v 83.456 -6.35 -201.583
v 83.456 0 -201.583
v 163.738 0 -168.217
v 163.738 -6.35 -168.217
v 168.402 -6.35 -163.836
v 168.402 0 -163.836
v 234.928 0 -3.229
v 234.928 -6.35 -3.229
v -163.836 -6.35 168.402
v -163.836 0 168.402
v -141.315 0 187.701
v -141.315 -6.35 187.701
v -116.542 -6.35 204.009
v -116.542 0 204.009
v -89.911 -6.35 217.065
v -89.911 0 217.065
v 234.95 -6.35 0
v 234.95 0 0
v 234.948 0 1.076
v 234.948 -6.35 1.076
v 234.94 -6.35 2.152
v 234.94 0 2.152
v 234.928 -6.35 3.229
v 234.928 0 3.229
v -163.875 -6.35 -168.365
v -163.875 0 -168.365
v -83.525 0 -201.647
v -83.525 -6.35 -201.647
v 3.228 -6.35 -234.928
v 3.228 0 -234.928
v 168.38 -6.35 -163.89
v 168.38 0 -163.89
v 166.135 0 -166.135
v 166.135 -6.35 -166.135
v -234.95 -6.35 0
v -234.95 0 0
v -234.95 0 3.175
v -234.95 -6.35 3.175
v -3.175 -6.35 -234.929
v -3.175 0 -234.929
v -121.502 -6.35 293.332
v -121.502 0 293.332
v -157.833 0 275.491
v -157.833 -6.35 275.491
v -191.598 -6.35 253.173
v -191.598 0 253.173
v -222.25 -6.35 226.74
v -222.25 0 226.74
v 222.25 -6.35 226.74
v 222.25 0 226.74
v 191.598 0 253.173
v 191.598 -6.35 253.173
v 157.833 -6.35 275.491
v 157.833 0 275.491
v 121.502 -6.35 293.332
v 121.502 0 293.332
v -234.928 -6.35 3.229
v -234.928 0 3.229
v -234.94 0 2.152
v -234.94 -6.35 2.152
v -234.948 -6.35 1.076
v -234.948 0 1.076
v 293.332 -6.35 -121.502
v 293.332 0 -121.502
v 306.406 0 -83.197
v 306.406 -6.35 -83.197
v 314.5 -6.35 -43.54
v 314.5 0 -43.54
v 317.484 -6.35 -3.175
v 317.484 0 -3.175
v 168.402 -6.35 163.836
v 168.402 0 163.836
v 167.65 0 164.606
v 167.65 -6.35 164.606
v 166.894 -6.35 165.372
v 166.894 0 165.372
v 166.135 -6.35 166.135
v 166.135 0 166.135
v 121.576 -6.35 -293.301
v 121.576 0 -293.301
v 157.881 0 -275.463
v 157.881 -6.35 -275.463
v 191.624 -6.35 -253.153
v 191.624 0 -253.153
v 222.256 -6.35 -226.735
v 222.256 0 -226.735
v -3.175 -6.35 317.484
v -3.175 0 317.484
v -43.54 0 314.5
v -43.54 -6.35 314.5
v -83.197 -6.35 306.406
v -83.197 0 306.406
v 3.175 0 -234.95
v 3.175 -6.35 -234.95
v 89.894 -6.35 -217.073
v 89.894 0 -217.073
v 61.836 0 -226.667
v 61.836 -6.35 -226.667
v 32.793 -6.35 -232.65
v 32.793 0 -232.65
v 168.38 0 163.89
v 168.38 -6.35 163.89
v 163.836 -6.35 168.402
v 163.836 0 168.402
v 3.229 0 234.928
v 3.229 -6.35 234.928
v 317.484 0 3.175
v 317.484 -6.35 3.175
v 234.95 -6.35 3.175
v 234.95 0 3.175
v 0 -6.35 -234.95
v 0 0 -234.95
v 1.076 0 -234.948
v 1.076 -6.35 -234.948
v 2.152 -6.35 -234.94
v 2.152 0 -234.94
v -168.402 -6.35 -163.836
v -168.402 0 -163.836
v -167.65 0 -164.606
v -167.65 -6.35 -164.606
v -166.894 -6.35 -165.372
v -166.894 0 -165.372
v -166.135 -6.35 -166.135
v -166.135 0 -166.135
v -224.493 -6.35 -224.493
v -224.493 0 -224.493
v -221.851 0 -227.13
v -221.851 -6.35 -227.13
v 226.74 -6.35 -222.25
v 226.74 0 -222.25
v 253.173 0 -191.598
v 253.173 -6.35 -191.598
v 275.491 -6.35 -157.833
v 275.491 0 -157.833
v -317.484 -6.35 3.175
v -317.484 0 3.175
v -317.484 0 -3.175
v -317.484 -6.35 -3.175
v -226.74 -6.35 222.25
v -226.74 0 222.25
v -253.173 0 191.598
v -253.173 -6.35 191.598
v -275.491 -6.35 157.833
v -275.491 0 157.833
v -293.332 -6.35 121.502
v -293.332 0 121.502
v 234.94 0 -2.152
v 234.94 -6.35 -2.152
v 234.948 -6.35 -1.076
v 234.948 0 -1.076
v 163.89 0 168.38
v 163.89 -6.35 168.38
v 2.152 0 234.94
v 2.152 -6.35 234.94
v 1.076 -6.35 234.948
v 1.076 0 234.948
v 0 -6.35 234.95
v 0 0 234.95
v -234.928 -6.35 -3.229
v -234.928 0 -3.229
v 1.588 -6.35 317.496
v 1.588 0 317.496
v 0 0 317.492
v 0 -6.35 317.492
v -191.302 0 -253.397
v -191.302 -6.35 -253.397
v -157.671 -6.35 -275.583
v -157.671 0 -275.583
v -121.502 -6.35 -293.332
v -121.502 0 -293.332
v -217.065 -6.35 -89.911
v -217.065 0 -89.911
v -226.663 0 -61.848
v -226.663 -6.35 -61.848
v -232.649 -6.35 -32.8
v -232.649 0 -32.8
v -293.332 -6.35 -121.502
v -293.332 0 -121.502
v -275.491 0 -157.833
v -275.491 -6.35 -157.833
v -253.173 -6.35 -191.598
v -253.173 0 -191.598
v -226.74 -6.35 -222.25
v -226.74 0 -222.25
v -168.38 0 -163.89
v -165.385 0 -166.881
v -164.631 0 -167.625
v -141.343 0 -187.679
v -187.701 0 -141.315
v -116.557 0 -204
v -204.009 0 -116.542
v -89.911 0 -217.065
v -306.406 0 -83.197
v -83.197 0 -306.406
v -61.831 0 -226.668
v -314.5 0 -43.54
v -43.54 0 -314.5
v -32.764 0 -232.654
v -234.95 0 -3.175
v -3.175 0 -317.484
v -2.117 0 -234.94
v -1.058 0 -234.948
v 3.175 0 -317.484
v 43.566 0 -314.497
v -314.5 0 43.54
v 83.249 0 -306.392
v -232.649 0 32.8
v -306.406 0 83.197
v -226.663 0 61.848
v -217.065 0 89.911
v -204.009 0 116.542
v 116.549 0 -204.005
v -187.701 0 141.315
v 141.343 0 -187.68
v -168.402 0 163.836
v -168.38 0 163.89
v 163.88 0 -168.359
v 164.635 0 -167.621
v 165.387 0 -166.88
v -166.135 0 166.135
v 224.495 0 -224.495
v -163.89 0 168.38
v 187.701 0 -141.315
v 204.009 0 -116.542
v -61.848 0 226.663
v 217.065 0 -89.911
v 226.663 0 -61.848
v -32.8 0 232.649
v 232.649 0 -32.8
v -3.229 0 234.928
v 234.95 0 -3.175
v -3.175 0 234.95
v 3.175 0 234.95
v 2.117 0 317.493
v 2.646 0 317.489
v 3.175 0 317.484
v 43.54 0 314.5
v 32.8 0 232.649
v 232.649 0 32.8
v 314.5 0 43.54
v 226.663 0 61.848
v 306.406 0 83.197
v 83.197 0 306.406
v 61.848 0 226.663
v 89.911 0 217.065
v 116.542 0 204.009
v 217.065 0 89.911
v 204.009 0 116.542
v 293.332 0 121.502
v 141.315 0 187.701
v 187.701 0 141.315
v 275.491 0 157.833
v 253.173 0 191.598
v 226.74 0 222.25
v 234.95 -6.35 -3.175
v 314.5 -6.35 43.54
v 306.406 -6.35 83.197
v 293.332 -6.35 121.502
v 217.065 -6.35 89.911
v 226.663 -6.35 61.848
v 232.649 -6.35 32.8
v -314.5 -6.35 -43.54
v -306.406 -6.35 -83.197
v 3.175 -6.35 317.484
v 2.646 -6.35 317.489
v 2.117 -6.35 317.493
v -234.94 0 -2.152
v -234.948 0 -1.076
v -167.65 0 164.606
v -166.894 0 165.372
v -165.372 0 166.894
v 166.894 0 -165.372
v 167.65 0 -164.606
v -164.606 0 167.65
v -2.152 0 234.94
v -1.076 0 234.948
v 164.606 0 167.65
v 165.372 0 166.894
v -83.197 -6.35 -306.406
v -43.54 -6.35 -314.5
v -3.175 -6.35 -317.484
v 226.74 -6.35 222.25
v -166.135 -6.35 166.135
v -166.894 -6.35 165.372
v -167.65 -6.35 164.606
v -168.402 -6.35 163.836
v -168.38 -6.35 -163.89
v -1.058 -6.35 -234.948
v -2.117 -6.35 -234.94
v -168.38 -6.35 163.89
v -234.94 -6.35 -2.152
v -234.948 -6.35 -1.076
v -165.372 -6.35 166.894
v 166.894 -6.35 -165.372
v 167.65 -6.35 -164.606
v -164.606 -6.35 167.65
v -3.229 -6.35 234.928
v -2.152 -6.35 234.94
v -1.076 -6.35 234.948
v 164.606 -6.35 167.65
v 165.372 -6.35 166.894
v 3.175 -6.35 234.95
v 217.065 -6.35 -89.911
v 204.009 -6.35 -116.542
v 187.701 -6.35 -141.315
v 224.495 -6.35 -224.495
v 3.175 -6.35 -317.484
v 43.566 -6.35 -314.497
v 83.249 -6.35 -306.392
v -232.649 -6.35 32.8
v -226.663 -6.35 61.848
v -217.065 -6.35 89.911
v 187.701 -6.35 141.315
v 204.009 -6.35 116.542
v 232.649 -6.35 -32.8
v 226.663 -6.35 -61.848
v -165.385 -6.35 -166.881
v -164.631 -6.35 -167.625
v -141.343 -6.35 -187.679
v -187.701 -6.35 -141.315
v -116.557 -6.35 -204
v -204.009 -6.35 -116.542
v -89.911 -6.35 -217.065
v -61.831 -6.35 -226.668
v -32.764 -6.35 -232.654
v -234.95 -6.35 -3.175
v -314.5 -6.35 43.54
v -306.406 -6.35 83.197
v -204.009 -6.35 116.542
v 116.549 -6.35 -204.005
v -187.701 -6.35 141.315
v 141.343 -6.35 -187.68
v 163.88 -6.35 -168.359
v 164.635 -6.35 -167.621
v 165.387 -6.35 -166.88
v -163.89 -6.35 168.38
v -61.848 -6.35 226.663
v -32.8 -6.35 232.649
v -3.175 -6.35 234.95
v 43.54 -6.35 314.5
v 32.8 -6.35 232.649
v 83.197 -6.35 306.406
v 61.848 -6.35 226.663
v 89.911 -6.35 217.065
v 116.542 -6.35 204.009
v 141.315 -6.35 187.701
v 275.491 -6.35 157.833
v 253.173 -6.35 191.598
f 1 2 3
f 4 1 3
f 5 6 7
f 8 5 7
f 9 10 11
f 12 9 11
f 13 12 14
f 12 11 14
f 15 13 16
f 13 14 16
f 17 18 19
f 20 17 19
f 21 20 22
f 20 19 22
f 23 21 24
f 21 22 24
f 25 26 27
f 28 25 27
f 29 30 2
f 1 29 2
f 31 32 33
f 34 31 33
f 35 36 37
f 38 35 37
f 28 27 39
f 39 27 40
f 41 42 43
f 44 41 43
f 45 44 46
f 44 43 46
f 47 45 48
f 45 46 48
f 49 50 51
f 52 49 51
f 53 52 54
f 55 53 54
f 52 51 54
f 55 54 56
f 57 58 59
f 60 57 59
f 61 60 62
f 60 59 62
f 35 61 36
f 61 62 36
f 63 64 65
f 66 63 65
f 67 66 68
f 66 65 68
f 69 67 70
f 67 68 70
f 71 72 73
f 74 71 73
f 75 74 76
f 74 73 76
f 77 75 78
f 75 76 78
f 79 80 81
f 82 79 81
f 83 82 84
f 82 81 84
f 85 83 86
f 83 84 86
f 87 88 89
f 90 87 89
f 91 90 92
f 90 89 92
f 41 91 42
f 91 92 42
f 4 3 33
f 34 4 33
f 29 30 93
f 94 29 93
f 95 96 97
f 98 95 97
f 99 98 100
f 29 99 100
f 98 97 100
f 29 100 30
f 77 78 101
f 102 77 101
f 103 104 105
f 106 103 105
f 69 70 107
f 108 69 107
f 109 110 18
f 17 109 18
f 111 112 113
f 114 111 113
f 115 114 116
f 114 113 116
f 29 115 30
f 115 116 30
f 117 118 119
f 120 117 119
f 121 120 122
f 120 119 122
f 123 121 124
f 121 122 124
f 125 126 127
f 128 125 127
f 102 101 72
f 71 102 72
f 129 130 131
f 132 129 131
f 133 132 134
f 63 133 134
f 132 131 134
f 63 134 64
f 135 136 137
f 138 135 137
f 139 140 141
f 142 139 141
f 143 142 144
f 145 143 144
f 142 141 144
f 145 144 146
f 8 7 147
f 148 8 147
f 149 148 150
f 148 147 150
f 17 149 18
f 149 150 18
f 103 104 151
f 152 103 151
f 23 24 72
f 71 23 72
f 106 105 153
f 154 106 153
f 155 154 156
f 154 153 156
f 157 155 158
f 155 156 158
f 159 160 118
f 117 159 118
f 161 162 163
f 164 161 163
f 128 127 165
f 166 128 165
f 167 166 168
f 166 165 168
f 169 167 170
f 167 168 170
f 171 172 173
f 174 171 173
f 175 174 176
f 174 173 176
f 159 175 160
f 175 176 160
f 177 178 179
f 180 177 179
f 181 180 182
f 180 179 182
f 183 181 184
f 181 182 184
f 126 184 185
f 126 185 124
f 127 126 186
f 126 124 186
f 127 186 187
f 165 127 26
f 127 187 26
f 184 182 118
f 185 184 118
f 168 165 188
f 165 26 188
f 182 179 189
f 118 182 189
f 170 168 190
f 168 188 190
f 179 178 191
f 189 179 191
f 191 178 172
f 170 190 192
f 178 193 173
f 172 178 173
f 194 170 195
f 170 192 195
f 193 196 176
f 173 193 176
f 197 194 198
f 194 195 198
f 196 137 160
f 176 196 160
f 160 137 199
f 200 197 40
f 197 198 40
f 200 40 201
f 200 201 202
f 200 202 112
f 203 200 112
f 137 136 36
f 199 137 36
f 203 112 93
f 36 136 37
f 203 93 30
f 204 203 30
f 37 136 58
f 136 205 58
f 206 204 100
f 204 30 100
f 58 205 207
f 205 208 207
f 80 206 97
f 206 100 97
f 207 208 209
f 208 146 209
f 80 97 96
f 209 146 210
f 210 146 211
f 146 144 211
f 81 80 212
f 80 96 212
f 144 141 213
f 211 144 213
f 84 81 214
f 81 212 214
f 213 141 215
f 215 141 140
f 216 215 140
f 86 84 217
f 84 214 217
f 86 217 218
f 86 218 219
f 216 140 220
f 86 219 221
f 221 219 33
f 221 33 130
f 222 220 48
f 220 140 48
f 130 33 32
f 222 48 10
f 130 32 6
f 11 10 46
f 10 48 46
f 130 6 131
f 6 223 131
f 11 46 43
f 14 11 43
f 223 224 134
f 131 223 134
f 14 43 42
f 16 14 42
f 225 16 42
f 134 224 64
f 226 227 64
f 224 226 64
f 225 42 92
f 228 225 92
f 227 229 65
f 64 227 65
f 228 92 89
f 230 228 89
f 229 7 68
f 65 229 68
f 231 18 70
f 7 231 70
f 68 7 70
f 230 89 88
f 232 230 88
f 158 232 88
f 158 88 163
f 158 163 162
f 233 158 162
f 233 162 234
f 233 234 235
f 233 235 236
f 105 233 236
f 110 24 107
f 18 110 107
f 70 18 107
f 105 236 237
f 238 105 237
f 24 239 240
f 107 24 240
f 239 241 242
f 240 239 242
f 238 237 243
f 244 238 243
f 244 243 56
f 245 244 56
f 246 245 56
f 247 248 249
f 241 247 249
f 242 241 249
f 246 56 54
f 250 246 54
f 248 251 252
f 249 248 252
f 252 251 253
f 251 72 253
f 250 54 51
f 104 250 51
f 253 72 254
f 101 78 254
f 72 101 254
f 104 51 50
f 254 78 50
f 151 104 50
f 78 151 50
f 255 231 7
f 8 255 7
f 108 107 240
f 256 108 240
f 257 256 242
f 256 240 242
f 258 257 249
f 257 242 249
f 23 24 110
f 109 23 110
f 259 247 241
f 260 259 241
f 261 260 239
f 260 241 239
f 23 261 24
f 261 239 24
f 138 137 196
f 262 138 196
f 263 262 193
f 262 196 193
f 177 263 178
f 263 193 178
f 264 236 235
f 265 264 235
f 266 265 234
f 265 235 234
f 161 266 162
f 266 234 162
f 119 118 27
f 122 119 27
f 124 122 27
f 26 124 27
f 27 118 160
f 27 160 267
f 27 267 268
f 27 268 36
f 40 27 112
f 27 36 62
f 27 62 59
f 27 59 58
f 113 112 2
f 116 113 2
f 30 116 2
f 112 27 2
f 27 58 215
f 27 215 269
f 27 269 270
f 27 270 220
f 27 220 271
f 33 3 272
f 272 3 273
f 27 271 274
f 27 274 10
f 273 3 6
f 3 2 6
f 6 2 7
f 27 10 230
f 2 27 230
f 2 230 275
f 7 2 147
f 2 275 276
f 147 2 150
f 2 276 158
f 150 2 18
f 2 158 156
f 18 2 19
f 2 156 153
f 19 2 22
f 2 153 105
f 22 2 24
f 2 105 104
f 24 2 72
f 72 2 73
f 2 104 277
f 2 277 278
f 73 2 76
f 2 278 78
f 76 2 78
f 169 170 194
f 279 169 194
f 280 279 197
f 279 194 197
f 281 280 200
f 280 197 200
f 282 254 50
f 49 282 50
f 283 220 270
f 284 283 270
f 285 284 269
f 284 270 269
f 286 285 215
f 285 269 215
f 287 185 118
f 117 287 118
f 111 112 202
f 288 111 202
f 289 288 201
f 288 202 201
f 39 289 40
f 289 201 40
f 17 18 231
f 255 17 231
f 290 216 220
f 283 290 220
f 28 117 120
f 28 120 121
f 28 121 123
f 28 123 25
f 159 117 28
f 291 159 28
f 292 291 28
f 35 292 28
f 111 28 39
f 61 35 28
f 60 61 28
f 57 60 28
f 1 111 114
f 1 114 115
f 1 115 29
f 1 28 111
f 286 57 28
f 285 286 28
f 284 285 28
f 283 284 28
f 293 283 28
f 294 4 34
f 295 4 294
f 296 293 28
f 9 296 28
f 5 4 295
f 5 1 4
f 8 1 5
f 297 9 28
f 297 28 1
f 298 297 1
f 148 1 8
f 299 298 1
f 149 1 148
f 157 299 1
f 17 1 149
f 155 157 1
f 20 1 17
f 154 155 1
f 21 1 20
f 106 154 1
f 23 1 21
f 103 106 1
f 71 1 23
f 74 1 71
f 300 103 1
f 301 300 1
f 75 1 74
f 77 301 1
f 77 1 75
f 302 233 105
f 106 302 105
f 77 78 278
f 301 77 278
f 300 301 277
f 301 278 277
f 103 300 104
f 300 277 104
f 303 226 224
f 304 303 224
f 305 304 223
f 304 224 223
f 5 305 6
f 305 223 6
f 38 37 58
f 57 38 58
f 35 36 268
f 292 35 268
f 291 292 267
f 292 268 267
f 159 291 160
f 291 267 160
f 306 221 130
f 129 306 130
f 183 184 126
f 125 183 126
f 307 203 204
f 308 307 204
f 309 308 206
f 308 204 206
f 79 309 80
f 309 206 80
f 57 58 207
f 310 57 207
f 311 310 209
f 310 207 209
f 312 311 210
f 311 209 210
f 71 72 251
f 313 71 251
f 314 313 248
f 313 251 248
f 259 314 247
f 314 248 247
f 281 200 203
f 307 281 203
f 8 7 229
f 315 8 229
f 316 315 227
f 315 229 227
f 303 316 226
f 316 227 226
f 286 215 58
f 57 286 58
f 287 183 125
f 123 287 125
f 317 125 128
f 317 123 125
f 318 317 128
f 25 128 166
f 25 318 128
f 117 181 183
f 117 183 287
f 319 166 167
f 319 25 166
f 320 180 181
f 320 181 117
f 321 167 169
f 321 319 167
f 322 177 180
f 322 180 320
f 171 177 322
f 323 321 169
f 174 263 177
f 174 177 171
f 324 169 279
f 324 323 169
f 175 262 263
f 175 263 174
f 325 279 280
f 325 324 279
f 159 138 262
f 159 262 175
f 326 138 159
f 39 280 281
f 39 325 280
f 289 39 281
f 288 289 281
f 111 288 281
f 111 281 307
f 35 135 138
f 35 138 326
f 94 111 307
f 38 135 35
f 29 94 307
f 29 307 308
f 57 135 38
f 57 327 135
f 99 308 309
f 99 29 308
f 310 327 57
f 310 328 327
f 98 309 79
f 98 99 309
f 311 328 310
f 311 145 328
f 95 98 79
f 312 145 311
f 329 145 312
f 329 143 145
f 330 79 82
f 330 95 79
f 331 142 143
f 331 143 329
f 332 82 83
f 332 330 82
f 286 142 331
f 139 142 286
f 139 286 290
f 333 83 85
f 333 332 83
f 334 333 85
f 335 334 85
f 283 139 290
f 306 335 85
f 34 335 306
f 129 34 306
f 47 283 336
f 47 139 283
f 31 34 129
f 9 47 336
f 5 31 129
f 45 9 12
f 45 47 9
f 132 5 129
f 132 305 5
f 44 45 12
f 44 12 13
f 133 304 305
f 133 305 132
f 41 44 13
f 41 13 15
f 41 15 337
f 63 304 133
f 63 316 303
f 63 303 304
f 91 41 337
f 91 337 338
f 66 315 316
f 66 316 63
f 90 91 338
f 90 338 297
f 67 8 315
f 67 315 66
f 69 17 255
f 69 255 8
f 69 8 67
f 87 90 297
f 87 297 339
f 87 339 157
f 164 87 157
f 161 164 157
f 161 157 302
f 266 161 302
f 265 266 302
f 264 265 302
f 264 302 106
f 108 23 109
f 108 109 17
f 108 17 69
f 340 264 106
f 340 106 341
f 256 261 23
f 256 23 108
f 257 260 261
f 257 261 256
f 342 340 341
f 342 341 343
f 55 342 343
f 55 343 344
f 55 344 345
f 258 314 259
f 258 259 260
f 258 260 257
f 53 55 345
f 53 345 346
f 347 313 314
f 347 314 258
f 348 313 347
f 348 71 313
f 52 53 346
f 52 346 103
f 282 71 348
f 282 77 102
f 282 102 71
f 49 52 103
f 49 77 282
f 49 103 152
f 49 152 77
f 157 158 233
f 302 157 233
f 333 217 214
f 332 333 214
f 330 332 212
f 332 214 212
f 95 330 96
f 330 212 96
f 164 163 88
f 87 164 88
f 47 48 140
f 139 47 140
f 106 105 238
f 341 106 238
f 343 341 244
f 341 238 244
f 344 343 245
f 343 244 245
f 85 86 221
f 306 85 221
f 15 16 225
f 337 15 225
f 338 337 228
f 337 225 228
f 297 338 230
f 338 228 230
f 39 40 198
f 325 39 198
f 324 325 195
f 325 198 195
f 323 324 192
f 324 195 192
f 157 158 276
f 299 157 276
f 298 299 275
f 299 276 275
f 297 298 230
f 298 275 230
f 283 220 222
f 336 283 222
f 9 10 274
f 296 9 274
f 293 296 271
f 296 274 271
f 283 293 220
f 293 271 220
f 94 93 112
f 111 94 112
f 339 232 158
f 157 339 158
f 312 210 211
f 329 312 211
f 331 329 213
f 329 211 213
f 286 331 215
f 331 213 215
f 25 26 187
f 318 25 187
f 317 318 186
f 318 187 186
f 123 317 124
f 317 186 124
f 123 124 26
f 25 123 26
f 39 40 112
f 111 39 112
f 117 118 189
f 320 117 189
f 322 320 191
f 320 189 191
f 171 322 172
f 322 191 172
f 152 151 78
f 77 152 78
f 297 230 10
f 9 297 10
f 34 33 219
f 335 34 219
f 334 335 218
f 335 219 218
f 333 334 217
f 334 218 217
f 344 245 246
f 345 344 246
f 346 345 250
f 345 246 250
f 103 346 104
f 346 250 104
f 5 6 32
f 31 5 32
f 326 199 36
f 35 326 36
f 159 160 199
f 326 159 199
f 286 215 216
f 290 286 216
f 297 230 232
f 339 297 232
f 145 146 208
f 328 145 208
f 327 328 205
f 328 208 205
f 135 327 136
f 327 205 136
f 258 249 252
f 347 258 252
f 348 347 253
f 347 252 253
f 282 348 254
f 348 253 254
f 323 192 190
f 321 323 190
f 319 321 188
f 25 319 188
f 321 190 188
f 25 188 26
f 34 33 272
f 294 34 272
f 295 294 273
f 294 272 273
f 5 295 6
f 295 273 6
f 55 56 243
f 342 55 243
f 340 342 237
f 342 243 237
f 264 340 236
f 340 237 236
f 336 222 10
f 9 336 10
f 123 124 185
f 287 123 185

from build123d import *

# Parameters (mm, degrees)
F1_DEPTH = 6.35


with BuildPart() as f1:
    # F0 (on Front) → F1 (new body)
    with BuildSketch(Plane.XZ):
        with BuildLine():
            Line((-293.331752, -89.911472), (-217.065496, -89.911472))
            ThreePointArc((-217.065496, -89.911472), (-230.115125, -47.418687), (-234.927816, -3.228556))
            Line((-234.927816, -3.228556), (-234.95, -3.175))
            Line((-234.95, -3.175), (-317.484125, -3.175))
            ThreePointArc((-317.484125, -3.175), (-311.085724, -63.497419), (-293.331752, -121.50199))
            Line((-293.331752, -121.50199), (-293.331752, -89.911472))
        make_face()
        Polygon((-293.331752, -121.50199), (-217.065496, -89.911472), (-293.331752, -89.911472), align=None)
        Polygon((-217.065496, -121.50199), (-217.065496, -89.911472), (-293.331752, -121.50199), align=None)
        with BuildLine():
            Line((-168.379802, -163.889674), (-168.401986, -163.836118))
            ThreePointArc((-168.401986, -163.836118), (-196.24604, -129.18589), (-217.065496, -89.911472))
            Line((-217.065496, -89.911472), (-217.065496, -121.50199))
            Line((-217.065496, -121.50199), (-293.331752, -121.50199))
            ThreePointArc((-293.331752, -121.50199), (-264.870281, -175.071369), (-226.740241, -222.250113))
            Line((-226.740241, -222.250113), (-168.379802, -163.889674))
        make_face()
        with BuildLine():
            ThreePointArc((-163.874556, -168.364582), (-165.008414, -167.253478), (-166.134738, -166.134738))
            Line((-166.134738, -166.134738), (-168.379802, -163.889674))
            Line((-168.379802, -163.889674), (-226.740241, -222.250113))
            Line((-226.740241, -222.250113), (-224.493206, -224.493206))
            Line((-224.493206, -224.493206), (-221.851465, -227.13031))
            Line((-221.851465, -227.13031), (-163.874556, -168.364582))
        make_face()
        with BuildLine():
            ThreePointArc((-89.911472, -217.065496), (-129.208289, -196.231294), (-163.874556, -168.364582))
            Line((-163.874556, -168.364582), (-221.851465, -227.13031))
            ThreePointArc((-221.851465, -227.13031), (-174.838658, -265.023949), (-121.50199, -293.331752))
            Line((-121.50199, -293.331752), (-121.50199, -217.065496))
            Line((-121.50199, -217.065496), (-89.911472, -217.065496))
        make_face()
        Polygon((-121.50199, -293.331752), (-89.911472, -217.065496), (-121.50199, -217.065496), align=None)
        Polygon((-89.911472, -293.331752), (-89.911472, -217.065496), (-121.50199, -293.331752), align=None)
        with BuildLine():
            ThreePointArc((-3.174928, -234.928547), (-47.392421, -230.120536), (-89.911472, -217.065496))
            Line((-89.911472, -217.065496), (-89.911472, -293.331752))
            Line((-89.911472, -293.331752), (-121.50199, -293.331752))
            ThreePointArc((-121.50199, -293.331752), (-63.497384, -311.085731), (-3.174928, -317.484125))
            Line((-3.174928, -317.484125), (-3.174928, -234.928547))
        make_face()
        with BuildLine():
            ThreePointArc((0, -234.95), (-1.5875, -234.944637), (-3.174928, -234.928547))
            Line((-3.174928, -234.928547), (-3.174928, -317.484125))
            Line((-3.174928, -317.484125), (0, -317.484125))
            Line((0, -317.484125), (3.175, -317.484125))
            Line((3.175, -317.484125), (3.175, -234.95))
            Line((3.175, -234.95), (0, -234.95))
        make_face()
        with BuildLine():
            ThreePointArc((89.894034, -217.072719), (47.409351, -230.117048), (3.228368, -234.927819))
            Line((3.228368, -234.927819), (3.175, -234.95))
            Line((3.175, -234.95), (3.175, -317.484125))
            ThreePointArc((3.175, -317.484125), (63.536764, -311.077691), (121.576185, -293.301008))
            Line((121.576185, -293.301008), (89.894034, -293.301008))
            Line((89.894034, -293.301008), (89.894034, -217.072719))
        make_face()
        Polygon((121.576185, -293.301008), (89.894034, -217.072719), (89.894034, -293.301008), align=None)
        Polygon((121.576185, -217.072719), (89.894034, -217.072719), (121.576185, -293.301008), align=None)
        with BuildLine():
            ThreePointArc((163.880118, -168.359168), (129.203647, -196.23435), (89.894034, -217.072719))
            Line((89.894034, -217.072719), (121.576185, -217.072719))
            Line((121.576185, -217.072719), (121.576185, -293.301008))
            ThreePointArc((121.576185, -293.301008), (175.108135, -264.845976), (222.255708, -226.734758))
            Line((222.255708, -226.734758), (163.880118, -168.359168))
        make_face()
        with BuildLine():
            ThreePointArc((166.134738, -166.134738), (165.011176, -167.250752), (163.880118, -168.359168))
            Line((163.880118, -168.359168), (222.255708, -226.734758))
            Line((222.255708, -226.734758), (224.495205, -224.495205))
            Line((224.495205, -224.495205), (226.740241, -222.250113))
            Line((226.740241, -222.250113), (168.379802, -163.889674))
            Line((168.379802, -163.889674), (166.134738, -166.134738))
        make_face()
        with BuildLine():
            ThreePointArc((217.065496, -89.911472), (196.24604, -129.18589), (168.401986, -163.836118))
            Line((168.401986, -163.836118), (168.379802, -163.889674))
            Line((168.379802, -163.889674), (226.740241, -222.250113))
            ThreePointArc((226.740241, -222.250113), (264.870281, -175.071369), (293.331752, -121.50199))
            Line((293.331752, -121.50199), (217.065496, -121.50199))
            Line((217.065496, -121.50199), (217.065496, -89.911472))
        make_face()
        Polygon((293.331752, -121.50199), (217.065496, -89.911472), (217.065496, -121.50199), align=None)
        Polygon((293.331752, -89.911472), (217.065496, -89.911472), (293.331752, -121.50199), align=None)
        with BuildLine():
            ThreePointArc((234.927816, -3.228556), (230.115125, -47.418687), (217.065496, -89.911472))
            Line((217.065496, -89.911472), (293.331752, -89.911472))
            Line((293.331752, -89.911472), (293.331752, -121.50199))
            ThreePointArc((293.331752, -121.50199), (311.085724, -63.497419), (317.484125, -3.175))
            Line((317.484125, -3.175), (234.95, -3.175))
            Line((234.95, -3.175), (234.927816, -3.228556))
        make_face()
        with BuildLine():
            ThreePointArc((217.065496, 89.911472), (230.115125, 47.418687), (234.927816, 3.228556))
            Line((234.927816, 3.228556), (234.95, 3.175))
            Line((234.95, 3.175), (317.484125, 3.175))
            ThreePointArc((317.484125, 3.175), (311.085724, 63.497419), (293.331752, 121.50199))
            Line((293.331752, 121.50199), (293.331752, 89.911472))
            Line((293.331752, 89.911472), (217.065496, 89.911472))
        make_face()
        Polygon((293.331752, 121.50199), (217.065496, 89.911472), (293.331752, 89.911472), align=None)
        Polygon((217.065496, 121.50199), (217.065496, 89.911472), (293.331752, 121.50199), align=None)
        with BuildLine():
            ThreePointArc((168.401986, 163.836118), (196.24604, 129.18589), (217.065496, 89.911472))
            Line((217.065496, 89.911472), (217.065496, 121.50199))
            Line((217.065496, 121.50199), (293.331752, 121.50199))
            ThreePointArc((293.331752, 121.50199), (264.870281, 175.071369), (226.740241, 222.250113))
            Line((226.740241, 222.250113), (168.379802, 163.889674))
            Line((168.379802, 163.889674), (168.401986, 163.836118))
        make_face()
        with BuildLine():
            Line((121.50199, 217.065496), (89.911472, 217.065496))
            ThreePointArc((89.911472, 217.065496), (129.18589, 196.24604), (163.836118, 168.401986))
            Line((163.836118, 168.401986), (163.889674, 168.379802))
            Line((163.889674, 168.379802), (222.250113, 226.740241))
            ThreePointArc((222.250113, 226.740241), (175.071369, 264.870281), (121.50199, 293.331752))
            Line((121.50199, 293.331752), (121.50199, 217.065496))
        make_face()
        Polygon((234.95, 3.175), (234.95, 0), (234.95, -3.175), (317.484125, -3.175), (317.484125, 0), (317.484125, 3.175), align=None)
        Polygon((163.889674, 168.379802), (166.134738, 166.134738), (168.379802, 163.889674), (226.740241, 222.250113), (224.495177, 224.495177), (222.250113, 226.740241), align=None)
        Polygon((121.50199, 293.331752), (89.911472, 217.065496), (121.50199, 217.065496), align=None)
        Polygon((89.911472, 293.331752), (89.911472, 217.065496), (121.50199, 293.331752), align=None)
        with BuildLine():
            Line((3.175, 234.95), (3.228556, 234.927816))
            ThreePointArc((3.228556, 234.927816), (47.418687, 230.115125), (89.911472, 217.065496))
            Line((89.911472, 217.065496), (89.911472, 293.331752))
            Line((89.911472, 293.331752), (121.50199, 293.331752))
            ThreePointArc((121.50199, 293.331752), (63.497419, 311.085724), (3.175, 317.484125))
            Line((3.175, 317.484125), (3.175, 234.95))
        make_face()
        with BuildLine():
            Line((-89.911472, 293.331752), (-89.911472, 217.065496))
            ThreePointArc((-89.911472, 217.065496), (-47.418687, 230.115125), (-3.228556, 234.927816))
            Line((-3.228556, 234.927816), (-3.175, 234.95))
            Line((-3.175, 234.95), (-3.175, 317.484125))
            ThreePointArc((-3.175, 317.484125), (-63.497419, 311.085724), (-121.50199, 293.331752))
            Line((-121.50199, 293.331752), (-89.911472, 293.331752))
        make_face()
        with BuildLine():
            Line((-3.175, 234.95), (0, 234.95))
            Line((0, 234.95), (3.175, 234.95))
            Line((3.175, 234.95), (3.175, 317.484125))
            ThreePointArc((3.175, 317.484125), (2.381262, 317.49107), (1.58751, 317.496031))
            Line((1.58751, 317.496031), (0, 317.492062))
            Line((0, 317.492062), (-3.175, 317.484125))
            Line((-3.175, 317.484125), (-3.175, 234.95))
        make_face()
        Polygon((-121.50199, 293.331752), (-89.911472, 217.065496), (-89.911472, 293.331752), align=None)
        Polygon((-121.50199, 217.065496), (-89.911472, 217.065496), (-121.50199, 293.331752), align=None)
        with BuildLine():
            Line((-163.889674, 168.379802), (-163.836118, 168.401986))
            ThreePointArc((-163.836118, 168.401986), (-129.18589, 196.24604), (-89.911472, 217.065496))
            Line((-89.911472, 217.065496), (-121.50199, 217.065496))
            Line((-121.50199, 217.065496), (-121.50199, 293.331752))
            ThreePointArc((-121.50199, 293.331752), (-175.071369, 264.870281), (-222.250113, 226.740241))
            Line((-222.250113, 226.740241), (-163.889674, 168.379802))
        make_face()
        Polygon((-168.379802, 163.889674), (-166.134738, 166.134738), (-163.889674, 168.379802), (-222.250113, 226.740241), (-224.495177, 224.495177), (-226.740241, 222.250113), align=None)
        with BuildLine():
            Line((-217.065496, 121.50199), (-217.065496, 89.911472))
            ThreePointArc((-217.065496, 89.911472), (-196.24604, 129.18589), (-168.401986, 163.836118))
            Line((-168.401986, 163.836118), (-168.379802, 163.889674))
            Line((-168.379802, 163.889674), (-226.740241, 222.250113))
            ThreePointArc((-226.740241, 222.250113), (-264.870281, 175.071369), (-293.331752, 121.50199))
            Line((-293.331752, 121.50199), (-217.065496, 121.50199))
        make_face()
        Polygon((-293.331752, 121.50199), (-217.065496, 89.911472), (-217.065496, 121.50199), align=None)
        Polygon((-293.331752, 89.911472), (-217.065496, 89.911472), (-293.331752, 121.50199), align=None)
        Polygon((-234.95, -3.175), (-234.95, 0), (-234.95, 3.175), (-317.484125, 3.175), (-317.484125, 0), (-317.484125, -3.175), align=None)
        with BuildLine():
            Line((-234.95, 3.175), (-234.927816, 3.228556))
            ThreePointArc((-234.927816, 3.228556), (-230.115125, 47.418687), (-217.065496, 89.911472))
            Line((-217.065496, 89.911472), (-293.331752, 89.911472))
            Line((-293.331752, 89.911472), (-293.331752, 121.50199))
            ThreePointArc((-293.331752, 121.50199), (-311.085724, 63.497419), (-317.484125, 3.175))
            Line((-317.484125, 3.175), (-234.95, 3.175))
        make_face()
        with BuildLine():
            ThreePointArc((-168.401986, -163.836118), (-167.27231, -164.989323), (-166.134738, -166.134738))
            Line((-166.134738, -166.134738), (-163.874556, -168.364582))
            Line((-163.874556, -168.364582), (-83.524742, -201.646564))
            Line((-83.524742, -201.646564), (-3.174928, -234.928547))
            Line((-3.174928, -234.928547), (0, -234.95))
            ThreePointArc((0, -234.95), (1.614222, -234.944455), (3.228368, -234.927819))
            Line((3.228368, -234.927819), (83.456302, -201.583327))
            Line((83.456302, -201.583327), (163.737605, -168.216654))
            Line((163.737605, -168.216654), (166.134738, -166.134738))
            ThreePointArc((166.134738, -166.134738), (167.27231, -164.989323), (168.401986, -163.836118))
            Line((168.401986, -163.836118), (201.664901, -83.532337))
            Line((201.664901, -83.532337), (234.927816, -3.228556))
            ThreePointArc((234.927816, -3.228556), (234.944454, -1.614316), (234.95, 0))
            ThreePointArc((234.95, 0), (234.944454, 1.614316), (234.927816, 3.228556))
            Line((234.927816, 3.228556), (201.664901, 83.532337))
            Line((201.664901, 83.532337), (168.401986, 163.836118))
            ThreePointArc((168.401986, 163.836118), (167.27231, 164.989323), (166.134738, 166.134738))
            ThreePointArc((166.134738, 166.134738), (164.989323, 167.27231), (163.836118, 168.401986))
            Line((163.836118, 168.401986), (83.532337, 201.664901))
            Line((83.532337, 201.664901), (3.228556, 234.927816))
            ThreePointArc((3.228556, 234.927816), (1.614316, 234.944454), (0, 234.95))
            ThreePointArc((0, 234.95), (-1.614316, 234.944454), (-3.228556, 234.927816))
            Line((-3.228556, 234.927816), (-83.532337, 201.664901))
            Line((-83.532337, 201.664901), (-163.836118, 168.401986))
            ThreePointArc((-163.836118, 168.401986), (-164.989323, 167.27231), (-166.134738, 166.134738))
            ThreePointArc((-166.134738, 166.134738), (-167.27231, 164.989323), (-168.401986, 163.836118))
            Line((-168.401986, 163.836118), (-201.664901, 83.532337))
            Line((-201.664901, 83.532337), (-234.927816, 3.228556))
            ThreePointArc((-234.927816, 3.228556), (-234.944454, 1.614316), (-234.95, 0))
            ThreePointArc((-234.95, 0), (-234.944454, -1.614316), (-234.927816, -3.228556))
            Line((-234.927816, -3.228556), (-201.664901, -83.532337))
            Line((-201.664901, -83.532337), (-168.401986, -163.836118))
        make_face()
    extrude(amount=F1_DEPTH)


solid = f1.part
